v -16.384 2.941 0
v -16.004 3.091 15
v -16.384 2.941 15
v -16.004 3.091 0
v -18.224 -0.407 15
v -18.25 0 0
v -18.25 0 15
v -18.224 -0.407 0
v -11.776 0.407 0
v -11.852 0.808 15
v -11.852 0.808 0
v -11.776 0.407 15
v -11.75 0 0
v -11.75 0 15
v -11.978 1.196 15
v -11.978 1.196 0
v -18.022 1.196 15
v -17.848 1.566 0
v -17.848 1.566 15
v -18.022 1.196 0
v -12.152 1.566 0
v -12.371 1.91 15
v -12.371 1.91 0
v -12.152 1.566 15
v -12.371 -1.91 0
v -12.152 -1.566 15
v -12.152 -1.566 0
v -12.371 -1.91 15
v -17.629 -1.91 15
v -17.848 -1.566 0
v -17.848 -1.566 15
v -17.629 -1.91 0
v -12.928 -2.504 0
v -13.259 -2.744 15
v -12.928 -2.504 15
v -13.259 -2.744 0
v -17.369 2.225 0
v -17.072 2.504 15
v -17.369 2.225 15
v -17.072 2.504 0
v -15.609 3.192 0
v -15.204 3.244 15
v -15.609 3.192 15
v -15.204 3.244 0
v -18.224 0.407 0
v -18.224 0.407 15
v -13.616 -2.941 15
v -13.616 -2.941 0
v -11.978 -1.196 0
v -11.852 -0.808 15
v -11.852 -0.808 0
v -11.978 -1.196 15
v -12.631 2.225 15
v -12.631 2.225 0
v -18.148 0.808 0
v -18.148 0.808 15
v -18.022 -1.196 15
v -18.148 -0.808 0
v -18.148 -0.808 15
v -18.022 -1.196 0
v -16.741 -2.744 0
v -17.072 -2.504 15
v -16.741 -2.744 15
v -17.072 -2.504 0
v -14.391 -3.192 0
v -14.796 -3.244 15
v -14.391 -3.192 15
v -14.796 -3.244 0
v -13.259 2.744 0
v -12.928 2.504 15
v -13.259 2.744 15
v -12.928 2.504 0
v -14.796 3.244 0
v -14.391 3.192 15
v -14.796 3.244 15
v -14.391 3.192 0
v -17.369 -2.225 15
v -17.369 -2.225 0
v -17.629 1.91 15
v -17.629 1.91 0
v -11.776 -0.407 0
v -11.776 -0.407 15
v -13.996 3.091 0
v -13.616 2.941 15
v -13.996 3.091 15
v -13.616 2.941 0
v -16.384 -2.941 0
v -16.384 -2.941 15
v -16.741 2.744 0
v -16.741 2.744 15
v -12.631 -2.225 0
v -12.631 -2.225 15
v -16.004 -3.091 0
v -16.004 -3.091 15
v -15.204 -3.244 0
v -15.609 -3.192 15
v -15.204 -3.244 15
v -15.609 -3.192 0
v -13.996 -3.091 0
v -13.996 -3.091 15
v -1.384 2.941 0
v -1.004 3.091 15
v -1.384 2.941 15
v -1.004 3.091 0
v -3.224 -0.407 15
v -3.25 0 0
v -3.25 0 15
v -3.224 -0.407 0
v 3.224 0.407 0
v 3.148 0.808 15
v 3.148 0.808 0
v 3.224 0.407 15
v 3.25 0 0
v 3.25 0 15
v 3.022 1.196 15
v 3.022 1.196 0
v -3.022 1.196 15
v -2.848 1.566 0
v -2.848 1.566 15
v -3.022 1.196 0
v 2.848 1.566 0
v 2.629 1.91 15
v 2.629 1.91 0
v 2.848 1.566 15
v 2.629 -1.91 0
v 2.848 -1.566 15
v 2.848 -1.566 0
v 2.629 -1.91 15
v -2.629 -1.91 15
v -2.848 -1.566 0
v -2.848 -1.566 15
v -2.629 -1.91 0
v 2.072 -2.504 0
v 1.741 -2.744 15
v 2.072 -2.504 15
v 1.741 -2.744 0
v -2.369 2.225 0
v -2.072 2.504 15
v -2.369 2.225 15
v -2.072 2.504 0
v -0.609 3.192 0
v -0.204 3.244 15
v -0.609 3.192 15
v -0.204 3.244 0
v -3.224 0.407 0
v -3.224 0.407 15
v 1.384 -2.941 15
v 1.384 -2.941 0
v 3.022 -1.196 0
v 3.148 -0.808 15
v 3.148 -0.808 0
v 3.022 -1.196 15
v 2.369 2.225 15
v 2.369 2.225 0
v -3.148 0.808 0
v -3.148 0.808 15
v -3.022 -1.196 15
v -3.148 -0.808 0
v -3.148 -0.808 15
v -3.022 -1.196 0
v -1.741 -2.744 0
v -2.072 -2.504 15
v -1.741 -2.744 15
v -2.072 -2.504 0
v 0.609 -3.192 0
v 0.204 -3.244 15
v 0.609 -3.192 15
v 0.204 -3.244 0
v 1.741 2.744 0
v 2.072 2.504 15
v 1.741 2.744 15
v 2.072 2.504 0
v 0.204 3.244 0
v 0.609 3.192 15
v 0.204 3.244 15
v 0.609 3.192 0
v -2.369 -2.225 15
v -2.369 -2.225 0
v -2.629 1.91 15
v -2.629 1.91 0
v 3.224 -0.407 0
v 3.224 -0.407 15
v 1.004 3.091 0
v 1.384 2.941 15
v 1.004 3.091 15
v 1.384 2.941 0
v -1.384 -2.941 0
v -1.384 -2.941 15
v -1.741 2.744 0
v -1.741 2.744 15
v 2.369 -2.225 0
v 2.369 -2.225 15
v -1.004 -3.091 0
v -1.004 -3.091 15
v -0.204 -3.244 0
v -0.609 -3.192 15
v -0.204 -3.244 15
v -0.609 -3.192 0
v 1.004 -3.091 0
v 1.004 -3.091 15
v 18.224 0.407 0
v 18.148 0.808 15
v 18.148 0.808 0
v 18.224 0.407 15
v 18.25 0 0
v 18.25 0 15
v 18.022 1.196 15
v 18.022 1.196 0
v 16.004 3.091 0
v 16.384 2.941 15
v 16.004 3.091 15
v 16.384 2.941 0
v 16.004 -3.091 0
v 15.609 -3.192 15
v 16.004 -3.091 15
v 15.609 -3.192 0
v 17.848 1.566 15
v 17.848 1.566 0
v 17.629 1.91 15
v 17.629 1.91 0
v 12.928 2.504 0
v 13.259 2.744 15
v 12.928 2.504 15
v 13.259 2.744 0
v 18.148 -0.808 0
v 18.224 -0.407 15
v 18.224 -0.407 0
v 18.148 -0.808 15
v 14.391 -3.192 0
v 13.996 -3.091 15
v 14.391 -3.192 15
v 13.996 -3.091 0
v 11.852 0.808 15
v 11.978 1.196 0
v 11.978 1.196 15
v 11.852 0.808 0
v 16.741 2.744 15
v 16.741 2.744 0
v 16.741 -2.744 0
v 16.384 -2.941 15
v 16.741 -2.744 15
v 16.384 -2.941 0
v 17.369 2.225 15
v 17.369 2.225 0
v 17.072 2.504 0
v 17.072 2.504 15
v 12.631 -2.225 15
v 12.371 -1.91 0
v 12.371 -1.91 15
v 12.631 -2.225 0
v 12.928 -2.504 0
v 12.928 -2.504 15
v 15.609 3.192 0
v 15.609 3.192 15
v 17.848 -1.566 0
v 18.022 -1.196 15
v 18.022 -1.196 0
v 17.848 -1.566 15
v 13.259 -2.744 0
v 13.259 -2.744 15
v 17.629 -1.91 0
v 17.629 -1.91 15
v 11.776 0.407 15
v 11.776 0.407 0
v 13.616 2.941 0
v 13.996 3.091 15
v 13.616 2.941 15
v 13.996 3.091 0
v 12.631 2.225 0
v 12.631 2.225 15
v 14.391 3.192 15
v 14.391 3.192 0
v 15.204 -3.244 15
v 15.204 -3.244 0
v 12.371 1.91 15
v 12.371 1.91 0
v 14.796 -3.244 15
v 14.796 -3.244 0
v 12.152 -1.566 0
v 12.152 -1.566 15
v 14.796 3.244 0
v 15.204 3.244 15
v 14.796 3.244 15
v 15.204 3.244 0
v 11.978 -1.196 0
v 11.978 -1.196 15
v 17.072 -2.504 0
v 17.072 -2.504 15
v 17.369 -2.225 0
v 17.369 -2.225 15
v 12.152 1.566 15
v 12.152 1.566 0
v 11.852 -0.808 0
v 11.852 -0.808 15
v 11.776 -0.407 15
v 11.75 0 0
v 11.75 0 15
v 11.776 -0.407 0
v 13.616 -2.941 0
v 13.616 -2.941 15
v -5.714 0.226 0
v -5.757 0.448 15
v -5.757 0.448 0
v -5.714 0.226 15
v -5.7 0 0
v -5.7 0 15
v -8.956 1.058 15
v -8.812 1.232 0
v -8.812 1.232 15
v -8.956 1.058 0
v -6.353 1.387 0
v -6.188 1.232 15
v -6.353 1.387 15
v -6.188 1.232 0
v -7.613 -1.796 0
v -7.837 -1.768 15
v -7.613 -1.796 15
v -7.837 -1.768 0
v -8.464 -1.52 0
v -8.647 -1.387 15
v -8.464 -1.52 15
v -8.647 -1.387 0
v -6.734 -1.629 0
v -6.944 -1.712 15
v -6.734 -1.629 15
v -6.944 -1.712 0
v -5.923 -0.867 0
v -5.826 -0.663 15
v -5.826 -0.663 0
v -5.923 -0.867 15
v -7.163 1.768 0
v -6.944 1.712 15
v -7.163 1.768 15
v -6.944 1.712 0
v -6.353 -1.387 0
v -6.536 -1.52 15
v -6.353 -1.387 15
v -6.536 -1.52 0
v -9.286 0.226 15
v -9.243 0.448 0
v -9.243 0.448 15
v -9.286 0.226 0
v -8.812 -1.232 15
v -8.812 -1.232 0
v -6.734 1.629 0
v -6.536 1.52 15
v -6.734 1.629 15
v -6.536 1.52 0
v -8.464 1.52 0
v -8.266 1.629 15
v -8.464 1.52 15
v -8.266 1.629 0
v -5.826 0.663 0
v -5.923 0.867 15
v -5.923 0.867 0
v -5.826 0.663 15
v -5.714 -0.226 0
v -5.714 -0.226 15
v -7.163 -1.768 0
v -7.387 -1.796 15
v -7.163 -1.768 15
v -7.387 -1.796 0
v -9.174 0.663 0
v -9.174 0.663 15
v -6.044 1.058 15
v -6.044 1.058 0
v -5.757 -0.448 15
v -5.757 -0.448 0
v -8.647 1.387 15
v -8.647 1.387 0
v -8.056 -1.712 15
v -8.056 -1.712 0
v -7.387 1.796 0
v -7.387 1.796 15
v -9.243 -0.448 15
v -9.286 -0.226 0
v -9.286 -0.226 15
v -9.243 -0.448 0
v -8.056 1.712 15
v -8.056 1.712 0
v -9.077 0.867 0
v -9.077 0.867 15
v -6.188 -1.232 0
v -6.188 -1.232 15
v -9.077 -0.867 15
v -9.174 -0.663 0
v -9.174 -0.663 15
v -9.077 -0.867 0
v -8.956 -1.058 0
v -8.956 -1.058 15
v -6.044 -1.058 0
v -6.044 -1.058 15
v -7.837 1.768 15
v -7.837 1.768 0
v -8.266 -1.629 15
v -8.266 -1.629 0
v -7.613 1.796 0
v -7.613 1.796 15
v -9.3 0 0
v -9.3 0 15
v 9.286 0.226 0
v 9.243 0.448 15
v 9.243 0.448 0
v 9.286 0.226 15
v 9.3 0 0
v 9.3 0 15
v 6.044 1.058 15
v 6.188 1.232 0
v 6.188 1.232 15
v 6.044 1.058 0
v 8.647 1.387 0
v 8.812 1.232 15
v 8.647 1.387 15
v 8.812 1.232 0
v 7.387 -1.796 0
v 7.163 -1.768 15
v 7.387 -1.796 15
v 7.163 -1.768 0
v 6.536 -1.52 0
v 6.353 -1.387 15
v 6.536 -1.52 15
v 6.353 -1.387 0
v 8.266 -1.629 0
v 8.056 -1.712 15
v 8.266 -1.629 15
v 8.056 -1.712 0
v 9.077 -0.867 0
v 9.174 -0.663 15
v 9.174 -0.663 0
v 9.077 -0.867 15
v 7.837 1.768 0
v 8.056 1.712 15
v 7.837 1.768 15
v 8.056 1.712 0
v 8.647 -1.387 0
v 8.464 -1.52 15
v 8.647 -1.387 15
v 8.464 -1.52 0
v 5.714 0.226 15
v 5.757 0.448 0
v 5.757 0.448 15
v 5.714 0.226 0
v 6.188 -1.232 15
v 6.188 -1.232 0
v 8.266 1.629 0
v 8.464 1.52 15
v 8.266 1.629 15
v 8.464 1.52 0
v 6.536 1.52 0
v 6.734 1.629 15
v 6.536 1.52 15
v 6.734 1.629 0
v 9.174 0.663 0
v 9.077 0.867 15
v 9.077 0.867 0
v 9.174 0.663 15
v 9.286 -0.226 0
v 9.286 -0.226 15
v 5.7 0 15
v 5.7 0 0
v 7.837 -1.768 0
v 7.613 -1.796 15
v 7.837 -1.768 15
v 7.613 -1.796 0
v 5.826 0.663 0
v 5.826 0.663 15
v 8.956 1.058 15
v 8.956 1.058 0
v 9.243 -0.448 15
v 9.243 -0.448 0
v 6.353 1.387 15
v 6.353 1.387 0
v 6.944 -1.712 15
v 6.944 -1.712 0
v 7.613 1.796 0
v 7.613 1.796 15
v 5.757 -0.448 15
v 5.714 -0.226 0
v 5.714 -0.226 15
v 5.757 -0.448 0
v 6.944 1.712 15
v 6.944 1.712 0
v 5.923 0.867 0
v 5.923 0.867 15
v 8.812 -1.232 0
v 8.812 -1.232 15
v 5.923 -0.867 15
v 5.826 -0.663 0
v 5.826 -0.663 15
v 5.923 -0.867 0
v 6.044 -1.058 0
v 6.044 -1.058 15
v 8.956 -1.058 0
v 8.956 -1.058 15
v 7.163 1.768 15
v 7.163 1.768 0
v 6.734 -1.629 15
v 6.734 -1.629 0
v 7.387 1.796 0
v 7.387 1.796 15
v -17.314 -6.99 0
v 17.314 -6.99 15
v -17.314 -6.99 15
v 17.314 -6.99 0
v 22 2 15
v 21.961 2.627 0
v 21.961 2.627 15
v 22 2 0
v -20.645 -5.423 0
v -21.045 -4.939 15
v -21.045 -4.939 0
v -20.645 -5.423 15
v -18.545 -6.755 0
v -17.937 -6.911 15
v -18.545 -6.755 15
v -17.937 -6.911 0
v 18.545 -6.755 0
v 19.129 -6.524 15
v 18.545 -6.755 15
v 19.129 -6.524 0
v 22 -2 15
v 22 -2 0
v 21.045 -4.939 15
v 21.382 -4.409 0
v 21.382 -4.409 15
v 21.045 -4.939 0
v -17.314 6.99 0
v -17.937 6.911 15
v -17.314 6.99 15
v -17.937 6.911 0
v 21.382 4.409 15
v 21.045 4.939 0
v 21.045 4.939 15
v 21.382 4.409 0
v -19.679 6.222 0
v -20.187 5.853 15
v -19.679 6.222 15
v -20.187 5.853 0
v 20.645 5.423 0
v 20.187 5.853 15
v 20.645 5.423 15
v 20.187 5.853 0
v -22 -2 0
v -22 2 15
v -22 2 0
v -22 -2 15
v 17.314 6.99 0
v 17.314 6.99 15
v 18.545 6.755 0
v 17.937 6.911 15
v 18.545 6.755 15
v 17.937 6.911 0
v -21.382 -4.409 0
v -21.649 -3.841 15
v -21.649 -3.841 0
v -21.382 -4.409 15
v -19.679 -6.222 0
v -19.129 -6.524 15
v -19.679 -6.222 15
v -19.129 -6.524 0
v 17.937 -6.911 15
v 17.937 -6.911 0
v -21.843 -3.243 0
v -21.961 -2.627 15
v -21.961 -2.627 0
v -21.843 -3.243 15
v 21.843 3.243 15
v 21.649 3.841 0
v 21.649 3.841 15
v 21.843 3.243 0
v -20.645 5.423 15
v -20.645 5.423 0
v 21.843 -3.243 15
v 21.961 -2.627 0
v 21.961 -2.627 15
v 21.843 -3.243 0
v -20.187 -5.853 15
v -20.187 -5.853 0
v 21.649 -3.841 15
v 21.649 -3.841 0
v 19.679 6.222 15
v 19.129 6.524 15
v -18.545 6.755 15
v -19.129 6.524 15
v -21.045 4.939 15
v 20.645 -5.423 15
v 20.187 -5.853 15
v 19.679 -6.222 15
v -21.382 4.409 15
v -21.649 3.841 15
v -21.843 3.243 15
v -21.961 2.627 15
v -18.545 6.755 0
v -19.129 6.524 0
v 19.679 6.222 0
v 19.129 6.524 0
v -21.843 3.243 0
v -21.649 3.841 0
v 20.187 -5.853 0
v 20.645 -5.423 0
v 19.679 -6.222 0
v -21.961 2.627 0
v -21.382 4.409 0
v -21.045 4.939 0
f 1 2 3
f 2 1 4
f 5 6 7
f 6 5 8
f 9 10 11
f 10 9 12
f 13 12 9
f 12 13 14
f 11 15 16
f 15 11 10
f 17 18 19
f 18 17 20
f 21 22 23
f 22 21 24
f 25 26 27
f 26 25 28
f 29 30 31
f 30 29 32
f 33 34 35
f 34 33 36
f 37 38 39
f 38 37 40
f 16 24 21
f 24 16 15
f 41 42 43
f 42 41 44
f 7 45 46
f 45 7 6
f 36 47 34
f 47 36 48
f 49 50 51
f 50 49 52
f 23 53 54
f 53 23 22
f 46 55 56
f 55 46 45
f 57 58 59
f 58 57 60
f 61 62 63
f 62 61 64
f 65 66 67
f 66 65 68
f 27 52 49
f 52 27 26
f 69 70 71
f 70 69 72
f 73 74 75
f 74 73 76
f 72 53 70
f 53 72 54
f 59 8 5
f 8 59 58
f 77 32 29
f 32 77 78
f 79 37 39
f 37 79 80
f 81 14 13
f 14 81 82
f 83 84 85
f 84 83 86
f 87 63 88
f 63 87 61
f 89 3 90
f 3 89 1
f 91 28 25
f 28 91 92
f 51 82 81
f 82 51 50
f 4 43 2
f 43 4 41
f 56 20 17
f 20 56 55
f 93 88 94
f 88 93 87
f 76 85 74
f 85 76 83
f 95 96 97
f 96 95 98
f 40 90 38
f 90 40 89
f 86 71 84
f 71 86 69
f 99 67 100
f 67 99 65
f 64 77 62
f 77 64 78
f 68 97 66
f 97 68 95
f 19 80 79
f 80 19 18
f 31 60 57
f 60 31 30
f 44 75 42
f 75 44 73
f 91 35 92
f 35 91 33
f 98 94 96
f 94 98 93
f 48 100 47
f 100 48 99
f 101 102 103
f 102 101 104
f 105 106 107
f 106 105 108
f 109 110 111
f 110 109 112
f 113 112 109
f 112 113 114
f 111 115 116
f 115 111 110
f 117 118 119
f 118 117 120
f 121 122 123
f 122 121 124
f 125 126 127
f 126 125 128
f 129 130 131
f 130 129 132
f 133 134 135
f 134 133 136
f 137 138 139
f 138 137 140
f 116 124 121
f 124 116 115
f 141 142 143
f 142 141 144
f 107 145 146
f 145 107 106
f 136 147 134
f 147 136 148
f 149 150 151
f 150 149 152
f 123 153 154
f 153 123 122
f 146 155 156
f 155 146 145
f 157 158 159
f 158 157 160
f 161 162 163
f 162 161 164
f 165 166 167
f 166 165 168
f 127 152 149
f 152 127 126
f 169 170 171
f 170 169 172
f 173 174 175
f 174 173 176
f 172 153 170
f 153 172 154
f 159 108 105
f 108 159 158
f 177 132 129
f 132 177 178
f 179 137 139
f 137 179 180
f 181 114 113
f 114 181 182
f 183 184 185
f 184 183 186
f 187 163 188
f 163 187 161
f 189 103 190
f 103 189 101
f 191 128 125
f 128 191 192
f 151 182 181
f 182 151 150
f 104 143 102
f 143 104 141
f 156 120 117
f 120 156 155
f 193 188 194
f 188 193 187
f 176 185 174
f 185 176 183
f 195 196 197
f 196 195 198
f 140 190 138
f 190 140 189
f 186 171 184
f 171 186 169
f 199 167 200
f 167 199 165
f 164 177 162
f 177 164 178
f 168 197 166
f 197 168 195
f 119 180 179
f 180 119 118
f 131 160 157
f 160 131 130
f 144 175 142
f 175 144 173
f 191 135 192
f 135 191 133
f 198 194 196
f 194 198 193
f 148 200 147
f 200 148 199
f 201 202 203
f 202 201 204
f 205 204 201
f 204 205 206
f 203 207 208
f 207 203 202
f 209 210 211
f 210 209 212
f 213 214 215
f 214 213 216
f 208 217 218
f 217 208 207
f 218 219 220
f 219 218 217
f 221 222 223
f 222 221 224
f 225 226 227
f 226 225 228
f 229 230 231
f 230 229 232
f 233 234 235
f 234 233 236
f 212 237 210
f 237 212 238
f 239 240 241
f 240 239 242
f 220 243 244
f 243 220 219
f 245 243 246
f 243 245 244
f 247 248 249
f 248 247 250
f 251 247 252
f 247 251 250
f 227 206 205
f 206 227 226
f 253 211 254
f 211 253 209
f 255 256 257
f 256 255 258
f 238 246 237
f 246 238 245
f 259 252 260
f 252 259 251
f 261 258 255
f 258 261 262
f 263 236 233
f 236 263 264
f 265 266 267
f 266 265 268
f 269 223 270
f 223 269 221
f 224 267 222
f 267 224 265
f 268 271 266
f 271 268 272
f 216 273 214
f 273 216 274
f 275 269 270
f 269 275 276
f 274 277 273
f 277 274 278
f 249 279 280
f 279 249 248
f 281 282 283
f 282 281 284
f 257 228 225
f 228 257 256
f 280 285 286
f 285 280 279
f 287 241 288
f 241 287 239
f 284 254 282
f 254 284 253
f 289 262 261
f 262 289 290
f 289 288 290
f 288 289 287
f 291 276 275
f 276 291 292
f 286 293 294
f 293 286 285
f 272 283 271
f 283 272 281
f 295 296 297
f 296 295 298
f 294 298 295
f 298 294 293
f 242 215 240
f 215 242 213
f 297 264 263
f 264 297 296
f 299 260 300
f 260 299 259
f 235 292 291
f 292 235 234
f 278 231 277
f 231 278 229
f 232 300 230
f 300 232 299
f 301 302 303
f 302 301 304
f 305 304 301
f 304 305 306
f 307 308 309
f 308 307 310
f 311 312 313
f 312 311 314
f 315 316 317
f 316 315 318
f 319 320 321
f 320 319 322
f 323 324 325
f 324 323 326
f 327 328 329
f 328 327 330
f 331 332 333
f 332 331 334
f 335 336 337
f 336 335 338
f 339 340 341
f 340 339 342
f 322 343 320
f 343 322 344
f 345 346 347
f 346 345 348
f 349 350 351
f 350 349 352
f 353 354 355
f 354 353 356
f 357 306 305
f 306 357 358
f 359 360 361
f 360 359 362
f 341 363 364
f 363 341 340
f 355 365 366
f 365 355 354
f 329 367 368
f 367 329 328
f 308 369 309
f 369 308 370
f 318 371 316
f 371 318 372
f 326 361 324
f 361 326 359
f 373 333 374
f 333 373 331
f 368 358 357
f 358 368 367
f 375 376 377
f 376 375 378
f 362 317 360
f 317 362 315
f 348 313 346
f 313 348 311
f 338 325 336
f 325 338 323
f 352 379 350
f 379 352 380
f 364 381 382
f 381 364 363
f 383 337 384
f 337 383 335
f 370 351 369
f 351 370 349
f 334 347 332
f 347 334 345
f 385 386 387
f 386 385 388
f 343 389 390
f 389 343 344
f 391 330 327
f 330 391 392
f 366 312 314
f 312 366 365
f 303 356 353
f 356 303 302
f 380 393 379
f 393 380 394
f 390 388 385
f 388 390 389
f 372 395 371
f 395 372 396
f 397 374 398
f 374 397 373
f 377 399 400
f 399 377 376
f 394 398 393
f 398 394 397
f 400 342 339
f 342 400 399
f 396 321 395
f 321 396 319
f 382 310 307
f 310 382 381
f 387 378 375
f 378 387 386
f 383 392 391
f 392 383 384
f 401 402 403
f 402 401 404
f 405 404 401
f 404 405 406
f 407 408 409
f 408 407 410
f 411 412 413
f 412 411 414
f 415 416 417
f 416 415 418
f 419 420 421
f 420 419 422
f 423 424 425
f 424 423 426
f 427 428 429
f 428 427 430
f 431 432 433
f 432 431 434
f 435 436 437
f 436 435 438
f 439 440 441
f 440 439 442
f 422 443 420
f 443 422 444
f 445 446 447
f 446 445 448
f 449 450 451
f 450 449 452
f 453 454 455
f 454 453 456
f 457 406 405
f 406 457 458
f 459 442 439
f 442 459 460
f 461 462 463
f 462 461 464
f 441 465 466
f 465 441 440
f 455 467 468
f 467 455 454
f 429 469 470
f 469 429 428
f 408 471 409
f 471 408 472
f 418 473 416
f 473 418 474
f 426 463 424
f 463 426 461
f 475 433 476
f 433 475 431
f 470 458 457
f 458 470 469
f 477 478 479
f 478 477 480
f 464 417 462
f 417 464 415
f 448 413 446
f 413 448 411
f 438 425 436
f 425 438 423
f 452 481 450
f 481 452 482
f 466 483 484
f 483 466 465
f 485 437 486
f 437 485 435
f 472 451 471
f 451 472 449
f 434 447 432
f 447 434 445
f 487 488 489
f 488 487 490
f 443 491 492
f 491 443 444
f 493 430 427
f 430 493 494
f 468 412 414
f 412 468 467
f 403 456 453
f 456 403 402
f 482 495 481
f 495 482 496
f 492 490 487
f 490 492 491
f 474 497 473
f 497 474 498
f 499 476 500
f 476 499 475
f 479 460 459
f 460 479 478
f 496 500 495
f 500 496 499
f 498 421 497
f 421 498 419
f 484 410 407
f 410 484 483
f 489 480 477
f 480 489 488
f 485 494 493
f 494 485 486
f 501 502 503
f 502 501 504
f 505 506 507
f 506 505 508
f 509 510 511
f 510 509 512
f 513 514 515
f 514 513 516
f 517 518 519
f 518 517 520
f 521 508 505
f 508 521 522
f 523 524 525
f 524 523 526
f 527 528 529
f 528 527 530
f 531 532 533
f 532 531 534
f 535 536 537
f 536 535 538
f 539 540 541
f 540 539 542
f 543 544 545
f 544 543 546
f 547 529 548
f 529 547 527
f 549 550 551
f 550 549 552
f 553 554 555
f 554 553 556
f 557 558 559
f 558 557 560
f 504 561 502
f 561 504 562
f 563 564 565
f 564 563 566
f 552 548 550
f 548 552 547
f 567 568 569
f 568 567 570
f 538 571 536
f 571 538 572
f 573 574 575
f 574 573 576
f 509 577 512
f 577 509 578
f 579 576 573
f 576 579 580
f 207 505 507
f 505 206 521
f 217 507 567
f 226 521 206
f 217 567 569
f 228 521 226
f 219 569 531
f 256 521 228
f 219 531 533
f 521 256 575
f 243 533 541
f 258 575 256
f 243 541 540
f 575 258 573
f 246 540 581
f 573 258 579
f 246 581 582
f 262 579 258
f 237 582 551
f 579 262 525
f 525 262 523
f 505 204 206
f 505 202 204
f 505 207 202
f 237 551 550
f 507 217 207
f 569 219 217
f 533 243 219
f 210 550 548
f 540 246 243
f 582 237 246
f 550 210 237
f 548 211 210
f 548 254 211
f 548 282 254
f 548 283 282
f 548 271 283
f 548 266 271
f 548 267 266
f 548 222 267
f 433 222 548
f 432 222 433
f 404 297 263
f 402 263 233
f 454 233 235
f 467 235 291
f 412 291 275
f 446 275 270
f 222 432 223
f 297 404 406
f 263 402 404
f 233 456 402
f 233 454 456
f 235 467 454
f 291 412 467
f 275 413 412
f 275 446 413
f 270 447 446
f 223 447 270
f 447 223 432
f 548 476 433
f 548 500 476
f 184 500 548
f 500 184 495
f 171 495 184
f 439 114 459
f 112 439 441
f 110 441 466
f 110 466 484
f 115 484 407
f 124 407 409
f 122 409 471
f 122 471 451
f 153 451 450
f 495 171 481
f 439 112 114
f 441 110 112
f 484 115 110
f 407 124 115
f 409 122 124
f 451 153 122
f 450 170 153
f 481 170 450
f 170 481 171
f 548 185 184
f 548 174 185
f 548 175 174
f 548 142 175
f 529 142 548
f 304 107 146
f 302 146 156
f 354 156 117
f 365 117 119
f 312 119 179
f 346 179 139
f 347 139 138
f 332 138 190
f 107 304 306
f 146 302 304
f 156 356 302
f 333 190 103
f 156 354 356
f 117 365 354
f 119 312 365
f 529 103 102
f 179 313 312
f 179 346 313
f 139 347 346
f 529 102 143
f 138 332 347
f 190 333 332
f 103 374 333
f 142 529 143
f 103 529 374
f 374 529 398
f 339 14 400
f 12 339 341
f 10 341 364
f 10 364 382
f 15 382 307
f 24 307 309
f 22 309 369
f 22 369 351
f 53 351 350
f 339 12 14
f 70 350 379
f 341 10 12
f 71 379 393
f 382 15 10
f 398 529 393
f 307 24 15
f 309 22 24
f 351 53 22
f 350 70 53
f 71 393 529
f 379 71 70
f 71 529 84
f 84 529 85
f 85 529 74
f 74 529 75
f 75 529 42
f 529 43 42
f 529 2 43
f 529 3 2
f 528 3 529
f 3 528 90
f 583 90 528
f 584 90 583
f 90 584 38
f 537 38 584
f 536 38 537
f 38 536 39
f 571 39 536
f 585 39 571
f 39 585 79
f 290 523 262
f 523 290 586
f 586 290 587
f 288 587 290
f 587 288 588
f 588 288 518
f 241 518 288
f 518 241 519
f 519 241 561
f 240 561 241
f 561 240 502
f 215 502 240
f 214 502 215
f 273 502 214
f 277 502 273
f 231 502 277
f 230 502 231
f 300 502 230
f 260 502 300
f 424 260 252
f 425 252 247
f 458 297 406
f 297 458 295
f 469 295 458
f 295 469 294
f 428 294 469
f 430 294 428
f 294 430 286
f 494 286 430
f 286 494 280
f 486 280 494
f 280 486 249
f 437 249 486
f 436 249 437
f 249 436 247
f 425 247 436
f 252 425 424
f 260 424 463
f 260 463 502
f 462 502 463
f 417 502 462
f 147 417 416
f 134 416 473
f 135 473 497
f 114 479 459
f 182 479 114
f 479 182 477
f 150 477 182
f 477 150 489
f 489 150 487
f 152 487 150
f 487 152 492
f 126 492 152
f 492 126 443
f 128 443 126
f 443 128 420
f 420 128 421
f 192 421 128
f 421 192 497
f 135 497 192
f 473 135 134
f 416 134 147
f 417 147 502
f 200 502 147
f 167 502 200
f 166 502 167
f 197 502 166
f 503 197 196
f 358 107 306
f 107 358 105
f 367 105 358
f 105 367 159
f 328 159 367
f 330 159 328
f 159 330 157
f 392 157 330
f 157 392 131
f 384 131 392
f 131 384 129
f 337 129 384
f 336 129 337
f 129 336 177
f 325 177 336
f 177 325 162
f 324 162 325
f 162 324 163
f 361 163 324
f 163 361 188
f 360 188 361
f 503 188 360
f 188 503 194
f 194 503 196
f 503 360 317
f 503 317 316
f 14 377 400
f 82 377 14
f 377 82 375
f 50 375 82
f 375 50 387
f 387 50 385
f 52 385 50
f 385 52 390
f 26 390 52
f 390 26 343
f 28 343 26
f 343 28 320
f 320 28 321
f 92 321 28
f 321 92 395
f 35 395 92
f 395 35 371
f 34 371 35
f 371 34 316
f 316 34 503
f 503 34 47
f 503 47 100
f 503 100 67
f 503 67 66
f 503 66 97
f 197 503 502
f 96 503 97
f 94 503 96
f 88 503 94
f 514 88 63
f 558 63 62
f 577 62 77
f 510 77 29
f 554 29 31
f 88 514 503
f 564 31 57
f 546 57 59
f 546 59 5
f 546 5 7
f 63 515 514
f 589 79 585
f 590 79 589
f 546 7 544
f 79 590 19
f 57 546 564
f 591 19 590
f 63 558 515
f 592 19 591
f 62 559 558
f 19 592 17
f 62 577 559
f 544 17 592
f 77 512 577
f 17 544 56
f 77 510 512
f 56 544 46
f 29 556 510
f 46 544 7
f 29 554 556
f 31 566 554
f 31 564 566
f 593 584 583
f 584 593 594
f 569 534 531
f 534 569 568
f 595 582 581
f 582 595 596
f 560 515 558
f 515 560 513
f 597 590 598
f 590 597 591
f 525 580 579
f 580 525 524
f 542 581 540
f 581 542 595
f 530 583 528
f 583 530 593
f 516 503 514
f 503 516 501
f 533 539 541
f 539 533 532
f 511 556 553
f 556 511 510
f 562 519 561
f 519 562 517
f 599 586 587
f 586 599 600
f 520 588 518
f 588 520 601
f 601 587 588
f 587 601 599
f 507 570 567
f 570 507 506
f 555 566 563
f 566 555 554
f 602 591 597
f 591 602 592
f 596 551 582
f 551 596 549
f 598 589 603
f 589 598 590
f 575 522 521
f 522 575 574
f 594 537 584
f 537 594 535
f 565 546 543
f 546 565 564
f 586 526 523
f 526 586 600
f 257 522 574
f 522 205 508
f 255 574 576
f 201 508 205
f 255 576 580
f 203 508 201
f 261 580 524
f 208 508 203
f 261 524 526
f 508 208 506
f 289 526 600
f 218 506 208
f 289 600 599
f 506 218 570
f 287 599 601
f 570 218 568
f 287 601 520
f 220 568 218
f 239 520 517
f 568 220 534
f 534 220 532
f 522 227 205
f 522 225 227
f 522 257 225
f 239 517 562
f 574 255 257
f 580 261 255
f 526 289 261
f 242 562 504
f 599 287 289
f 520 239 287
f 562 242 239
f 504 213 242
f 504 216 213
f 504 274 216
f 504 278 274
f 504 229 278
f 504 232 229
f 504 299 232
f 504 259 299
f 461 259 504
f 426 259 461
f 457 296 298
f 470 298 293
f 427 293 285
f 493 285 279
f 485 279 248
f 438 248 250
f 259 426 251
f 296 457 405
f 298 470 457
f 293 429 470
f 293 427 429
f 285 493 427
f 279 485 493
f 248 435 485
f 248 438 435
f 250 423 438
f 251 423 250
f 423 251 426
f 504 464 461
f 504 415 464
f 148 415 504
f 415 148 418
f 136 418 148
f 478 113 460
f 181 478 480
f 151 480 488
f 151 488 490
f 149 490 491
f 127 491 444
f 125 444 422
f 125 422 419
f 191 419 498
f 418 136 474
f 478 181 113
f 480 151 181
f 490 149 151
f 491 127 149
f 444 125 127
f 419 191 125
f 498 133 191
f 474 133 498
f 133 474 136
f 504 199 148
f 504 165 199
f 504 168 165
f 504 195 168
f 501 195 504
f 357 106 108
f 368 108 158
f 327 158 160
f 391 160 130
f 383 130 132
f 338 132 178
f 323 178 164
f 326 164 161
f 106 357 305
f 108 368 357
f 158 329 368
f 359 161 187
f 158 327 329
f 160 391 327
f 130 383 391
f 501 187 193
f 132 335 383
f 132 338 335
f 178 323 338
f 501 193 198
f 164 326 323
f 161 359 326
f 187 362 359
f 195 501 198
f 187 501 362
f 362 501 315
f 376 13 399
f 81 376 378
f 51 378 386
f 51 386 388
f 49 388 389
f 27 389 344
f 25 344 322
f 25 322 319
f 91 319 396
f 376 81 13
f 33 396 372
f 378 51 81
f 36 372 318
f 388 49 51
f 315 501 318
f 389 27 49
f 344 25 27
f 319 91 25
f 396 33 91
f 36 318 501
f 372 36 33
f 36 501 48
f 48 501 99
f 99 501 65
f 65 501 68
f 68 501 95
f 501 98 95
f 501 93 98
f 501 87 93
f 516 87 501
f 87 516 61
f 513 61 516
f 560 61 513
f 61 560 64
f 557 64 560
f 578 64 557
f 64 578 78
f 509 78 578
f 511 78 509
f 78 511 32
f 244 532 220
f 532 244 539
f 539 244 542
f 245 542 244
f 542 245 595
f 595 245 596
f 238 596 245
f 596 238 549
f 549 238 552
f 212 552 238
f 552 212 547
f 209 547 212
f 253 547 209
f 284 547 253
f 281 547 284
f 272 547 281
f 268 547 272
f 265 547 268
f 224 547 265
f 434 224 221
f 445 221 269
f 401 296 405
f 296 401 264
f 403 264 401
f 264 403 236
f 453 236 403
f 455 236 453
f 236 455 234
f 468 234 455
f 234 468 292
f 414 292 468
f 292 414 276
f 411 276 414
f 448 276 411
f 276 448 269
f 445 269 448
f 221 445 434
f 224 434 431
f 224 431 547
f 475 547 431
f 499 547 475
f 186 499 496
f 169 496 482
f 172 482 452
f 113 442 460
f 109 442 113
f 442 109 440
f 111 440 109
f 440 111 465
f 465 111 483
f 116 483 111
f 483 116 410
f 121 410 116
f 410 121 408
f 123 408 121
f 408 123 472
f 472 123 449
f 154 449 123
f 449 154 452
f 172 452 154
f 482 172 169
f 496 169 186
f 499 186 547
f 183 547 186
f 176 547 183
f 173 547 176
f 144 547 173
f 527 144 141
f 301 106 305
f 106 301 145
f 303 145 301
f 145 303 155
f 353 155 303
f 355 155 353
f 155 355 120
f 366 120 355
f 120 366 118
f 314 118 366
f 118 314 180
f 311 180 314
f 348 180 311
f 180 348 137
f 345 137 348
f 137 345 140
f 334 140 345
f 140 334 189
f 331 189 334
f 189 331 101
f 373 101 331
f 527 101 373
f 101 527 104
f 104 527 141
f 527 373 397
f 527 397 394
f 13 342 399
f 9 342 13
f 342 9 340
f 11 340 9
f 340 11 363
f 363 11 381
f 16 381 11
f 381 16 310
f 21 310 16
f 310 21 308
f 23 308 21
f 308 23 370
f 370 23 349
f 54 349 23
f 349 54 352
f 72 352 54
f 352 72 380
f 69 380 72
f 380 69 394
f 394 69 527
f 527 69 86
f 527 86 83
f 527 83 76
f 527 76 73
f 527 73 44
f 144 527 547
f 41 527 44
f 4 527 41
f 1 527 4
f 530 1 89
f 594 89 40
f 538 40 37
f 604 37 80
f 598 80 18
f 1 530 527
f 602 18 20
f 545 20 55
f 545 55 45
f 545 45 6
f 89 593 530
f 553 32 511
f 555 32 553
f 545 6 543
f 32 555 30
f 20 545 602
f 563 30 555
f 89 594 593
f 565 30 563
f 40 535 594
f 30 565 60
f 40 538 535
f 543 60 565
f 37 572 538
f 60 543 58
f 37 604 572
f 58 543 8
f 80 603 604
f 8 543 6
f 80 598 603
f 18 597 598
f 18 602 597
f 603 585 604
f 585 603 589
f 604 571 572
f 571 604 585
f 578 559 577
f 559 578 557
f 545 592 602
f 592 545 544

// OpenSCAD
$fn = 50;


difference() {
	union() {
		translate(v = [0, 0, 0]) {
			rotate(a = [0, 0, 0]) {
				hull() {
					translate(v = [-17.0000000000, 2.0000000000, 0]) {
						rotate(a = [0, 0, 0]) {
							translate(v = [0, 0, 0]) {
								rotate(a = [0, 0, 0]) {
									cylinder(h = 15, r = 5);
								}
							}
						}
					}
					translate(v = [17.0000000000, 2.0000000000, 0]) {
						rotate(a = [0, 0, 0]) {
							translate(v = [0, 0, 0]) {
								rotate(a = [0, 0, 0]) {
									cylinder(h = 15, r = 5);
								}
							}
						}
					}
					translate(v = [-17.0000000000, -2.0000000000, 0]) {
						rotate(a = [0, 0, 0]) {
							translate(v = [0, 0, 0]) {
								rotate(a = [0, 0, 0]) {
									cylinder(h = 15, r = 5);
								}
							}
						}
					}
					translate(v = [17.0000000000, -2.0000000000, 0]) {
						rotate(a = [0, 0, 0]) {
							translate(v = [0, 0, 0]) {
								rotate(a = [0, 0, 0]) {
									cylinder(h = 15, r = 5);
								}
							}
						}
					}
				}
			}
		}
	}
	union() {
		translate(v = [-15.0000000000, 0.0000000000, 0]) {
			rotate(a = [0, 0, 0]) {
				translate(v = [0, 0, -50]) {
					rotate(a = [0, 0, 0]) {
						cylinder(h = 100, r = 3.2500000000);
					}
				}
			}
		}
		translate(v = [0.0000000000, 0.0000000000, 0]) {
			rotate(a = [0, 0, 0]) {
				translate(v = [0, 0, -50]) {
					rotate(a = [0, 0, 0]) {
						cylinder(h = 100, r = 3.2500000000);
					}
				}
			}
		}
		translate(v = [15.0000000000, 0.0000000000, 0]) {
			rotate(a = [0, 0, 0]) {
				translate(v = [0, 0, -50]) {
					rotate(a = [0, 0, 0]) {
						cylinder(h = 100, r = 3.2500000000);
					}
				}
			}
		}
		translate(v = [-15.0000000000, 0.0000000000, 0]) {
			rotate(a = [0, 0, 0]) {
				translate(v = [0, 0, -50]) {
					rotate(a = [0, 0, 0]) {
						cylinder(h = 100, r = 1.8000000000);
					}
				}
			}
		}
		translate(v = [-7.5000000000, 0.0000000000, 0]) {
			rotate(a = [0, 0, 0]) {
				translate(v = [0, 0, -50]) {
					rotate(a = [0, 0, 0]) {
						cylinder(h = 100, r = 1.8000000000);
					}
				}
			}
		}
		translate(v = [0.0000000000, 0.0000000000, 0]) {
			rotate(a = [0, 0, 0]) {
				translate(v = [0, 0, -50]) {
					rotate(a = [0, 0, 0]) {
						cylinder(h = 100, r = 1.8000000000);
					}
				}
			}
		}
		translate(v = [7.5000000000, 0.0000000000, 0]) {
			rotate(a = [0, 0, 0]) {
				translate(v = [0, 0, -50]) {
					rotate(a = [0, 0, 0]) {
						cylinder(h = 100, r = 1.8000000000);
					}
				}
			}
		}
		translate(v = [15.0000000000, 0.0000000000, 0]) {
			rotate(a = [0, 0, 0]) {
				translate(v = [0, 0, -50]) {
					rotate(a = [0, 0, 0]) {
						cylinder(h = 100, r = 1.8000000000);
					}
				}
			}
		}
	}
}
